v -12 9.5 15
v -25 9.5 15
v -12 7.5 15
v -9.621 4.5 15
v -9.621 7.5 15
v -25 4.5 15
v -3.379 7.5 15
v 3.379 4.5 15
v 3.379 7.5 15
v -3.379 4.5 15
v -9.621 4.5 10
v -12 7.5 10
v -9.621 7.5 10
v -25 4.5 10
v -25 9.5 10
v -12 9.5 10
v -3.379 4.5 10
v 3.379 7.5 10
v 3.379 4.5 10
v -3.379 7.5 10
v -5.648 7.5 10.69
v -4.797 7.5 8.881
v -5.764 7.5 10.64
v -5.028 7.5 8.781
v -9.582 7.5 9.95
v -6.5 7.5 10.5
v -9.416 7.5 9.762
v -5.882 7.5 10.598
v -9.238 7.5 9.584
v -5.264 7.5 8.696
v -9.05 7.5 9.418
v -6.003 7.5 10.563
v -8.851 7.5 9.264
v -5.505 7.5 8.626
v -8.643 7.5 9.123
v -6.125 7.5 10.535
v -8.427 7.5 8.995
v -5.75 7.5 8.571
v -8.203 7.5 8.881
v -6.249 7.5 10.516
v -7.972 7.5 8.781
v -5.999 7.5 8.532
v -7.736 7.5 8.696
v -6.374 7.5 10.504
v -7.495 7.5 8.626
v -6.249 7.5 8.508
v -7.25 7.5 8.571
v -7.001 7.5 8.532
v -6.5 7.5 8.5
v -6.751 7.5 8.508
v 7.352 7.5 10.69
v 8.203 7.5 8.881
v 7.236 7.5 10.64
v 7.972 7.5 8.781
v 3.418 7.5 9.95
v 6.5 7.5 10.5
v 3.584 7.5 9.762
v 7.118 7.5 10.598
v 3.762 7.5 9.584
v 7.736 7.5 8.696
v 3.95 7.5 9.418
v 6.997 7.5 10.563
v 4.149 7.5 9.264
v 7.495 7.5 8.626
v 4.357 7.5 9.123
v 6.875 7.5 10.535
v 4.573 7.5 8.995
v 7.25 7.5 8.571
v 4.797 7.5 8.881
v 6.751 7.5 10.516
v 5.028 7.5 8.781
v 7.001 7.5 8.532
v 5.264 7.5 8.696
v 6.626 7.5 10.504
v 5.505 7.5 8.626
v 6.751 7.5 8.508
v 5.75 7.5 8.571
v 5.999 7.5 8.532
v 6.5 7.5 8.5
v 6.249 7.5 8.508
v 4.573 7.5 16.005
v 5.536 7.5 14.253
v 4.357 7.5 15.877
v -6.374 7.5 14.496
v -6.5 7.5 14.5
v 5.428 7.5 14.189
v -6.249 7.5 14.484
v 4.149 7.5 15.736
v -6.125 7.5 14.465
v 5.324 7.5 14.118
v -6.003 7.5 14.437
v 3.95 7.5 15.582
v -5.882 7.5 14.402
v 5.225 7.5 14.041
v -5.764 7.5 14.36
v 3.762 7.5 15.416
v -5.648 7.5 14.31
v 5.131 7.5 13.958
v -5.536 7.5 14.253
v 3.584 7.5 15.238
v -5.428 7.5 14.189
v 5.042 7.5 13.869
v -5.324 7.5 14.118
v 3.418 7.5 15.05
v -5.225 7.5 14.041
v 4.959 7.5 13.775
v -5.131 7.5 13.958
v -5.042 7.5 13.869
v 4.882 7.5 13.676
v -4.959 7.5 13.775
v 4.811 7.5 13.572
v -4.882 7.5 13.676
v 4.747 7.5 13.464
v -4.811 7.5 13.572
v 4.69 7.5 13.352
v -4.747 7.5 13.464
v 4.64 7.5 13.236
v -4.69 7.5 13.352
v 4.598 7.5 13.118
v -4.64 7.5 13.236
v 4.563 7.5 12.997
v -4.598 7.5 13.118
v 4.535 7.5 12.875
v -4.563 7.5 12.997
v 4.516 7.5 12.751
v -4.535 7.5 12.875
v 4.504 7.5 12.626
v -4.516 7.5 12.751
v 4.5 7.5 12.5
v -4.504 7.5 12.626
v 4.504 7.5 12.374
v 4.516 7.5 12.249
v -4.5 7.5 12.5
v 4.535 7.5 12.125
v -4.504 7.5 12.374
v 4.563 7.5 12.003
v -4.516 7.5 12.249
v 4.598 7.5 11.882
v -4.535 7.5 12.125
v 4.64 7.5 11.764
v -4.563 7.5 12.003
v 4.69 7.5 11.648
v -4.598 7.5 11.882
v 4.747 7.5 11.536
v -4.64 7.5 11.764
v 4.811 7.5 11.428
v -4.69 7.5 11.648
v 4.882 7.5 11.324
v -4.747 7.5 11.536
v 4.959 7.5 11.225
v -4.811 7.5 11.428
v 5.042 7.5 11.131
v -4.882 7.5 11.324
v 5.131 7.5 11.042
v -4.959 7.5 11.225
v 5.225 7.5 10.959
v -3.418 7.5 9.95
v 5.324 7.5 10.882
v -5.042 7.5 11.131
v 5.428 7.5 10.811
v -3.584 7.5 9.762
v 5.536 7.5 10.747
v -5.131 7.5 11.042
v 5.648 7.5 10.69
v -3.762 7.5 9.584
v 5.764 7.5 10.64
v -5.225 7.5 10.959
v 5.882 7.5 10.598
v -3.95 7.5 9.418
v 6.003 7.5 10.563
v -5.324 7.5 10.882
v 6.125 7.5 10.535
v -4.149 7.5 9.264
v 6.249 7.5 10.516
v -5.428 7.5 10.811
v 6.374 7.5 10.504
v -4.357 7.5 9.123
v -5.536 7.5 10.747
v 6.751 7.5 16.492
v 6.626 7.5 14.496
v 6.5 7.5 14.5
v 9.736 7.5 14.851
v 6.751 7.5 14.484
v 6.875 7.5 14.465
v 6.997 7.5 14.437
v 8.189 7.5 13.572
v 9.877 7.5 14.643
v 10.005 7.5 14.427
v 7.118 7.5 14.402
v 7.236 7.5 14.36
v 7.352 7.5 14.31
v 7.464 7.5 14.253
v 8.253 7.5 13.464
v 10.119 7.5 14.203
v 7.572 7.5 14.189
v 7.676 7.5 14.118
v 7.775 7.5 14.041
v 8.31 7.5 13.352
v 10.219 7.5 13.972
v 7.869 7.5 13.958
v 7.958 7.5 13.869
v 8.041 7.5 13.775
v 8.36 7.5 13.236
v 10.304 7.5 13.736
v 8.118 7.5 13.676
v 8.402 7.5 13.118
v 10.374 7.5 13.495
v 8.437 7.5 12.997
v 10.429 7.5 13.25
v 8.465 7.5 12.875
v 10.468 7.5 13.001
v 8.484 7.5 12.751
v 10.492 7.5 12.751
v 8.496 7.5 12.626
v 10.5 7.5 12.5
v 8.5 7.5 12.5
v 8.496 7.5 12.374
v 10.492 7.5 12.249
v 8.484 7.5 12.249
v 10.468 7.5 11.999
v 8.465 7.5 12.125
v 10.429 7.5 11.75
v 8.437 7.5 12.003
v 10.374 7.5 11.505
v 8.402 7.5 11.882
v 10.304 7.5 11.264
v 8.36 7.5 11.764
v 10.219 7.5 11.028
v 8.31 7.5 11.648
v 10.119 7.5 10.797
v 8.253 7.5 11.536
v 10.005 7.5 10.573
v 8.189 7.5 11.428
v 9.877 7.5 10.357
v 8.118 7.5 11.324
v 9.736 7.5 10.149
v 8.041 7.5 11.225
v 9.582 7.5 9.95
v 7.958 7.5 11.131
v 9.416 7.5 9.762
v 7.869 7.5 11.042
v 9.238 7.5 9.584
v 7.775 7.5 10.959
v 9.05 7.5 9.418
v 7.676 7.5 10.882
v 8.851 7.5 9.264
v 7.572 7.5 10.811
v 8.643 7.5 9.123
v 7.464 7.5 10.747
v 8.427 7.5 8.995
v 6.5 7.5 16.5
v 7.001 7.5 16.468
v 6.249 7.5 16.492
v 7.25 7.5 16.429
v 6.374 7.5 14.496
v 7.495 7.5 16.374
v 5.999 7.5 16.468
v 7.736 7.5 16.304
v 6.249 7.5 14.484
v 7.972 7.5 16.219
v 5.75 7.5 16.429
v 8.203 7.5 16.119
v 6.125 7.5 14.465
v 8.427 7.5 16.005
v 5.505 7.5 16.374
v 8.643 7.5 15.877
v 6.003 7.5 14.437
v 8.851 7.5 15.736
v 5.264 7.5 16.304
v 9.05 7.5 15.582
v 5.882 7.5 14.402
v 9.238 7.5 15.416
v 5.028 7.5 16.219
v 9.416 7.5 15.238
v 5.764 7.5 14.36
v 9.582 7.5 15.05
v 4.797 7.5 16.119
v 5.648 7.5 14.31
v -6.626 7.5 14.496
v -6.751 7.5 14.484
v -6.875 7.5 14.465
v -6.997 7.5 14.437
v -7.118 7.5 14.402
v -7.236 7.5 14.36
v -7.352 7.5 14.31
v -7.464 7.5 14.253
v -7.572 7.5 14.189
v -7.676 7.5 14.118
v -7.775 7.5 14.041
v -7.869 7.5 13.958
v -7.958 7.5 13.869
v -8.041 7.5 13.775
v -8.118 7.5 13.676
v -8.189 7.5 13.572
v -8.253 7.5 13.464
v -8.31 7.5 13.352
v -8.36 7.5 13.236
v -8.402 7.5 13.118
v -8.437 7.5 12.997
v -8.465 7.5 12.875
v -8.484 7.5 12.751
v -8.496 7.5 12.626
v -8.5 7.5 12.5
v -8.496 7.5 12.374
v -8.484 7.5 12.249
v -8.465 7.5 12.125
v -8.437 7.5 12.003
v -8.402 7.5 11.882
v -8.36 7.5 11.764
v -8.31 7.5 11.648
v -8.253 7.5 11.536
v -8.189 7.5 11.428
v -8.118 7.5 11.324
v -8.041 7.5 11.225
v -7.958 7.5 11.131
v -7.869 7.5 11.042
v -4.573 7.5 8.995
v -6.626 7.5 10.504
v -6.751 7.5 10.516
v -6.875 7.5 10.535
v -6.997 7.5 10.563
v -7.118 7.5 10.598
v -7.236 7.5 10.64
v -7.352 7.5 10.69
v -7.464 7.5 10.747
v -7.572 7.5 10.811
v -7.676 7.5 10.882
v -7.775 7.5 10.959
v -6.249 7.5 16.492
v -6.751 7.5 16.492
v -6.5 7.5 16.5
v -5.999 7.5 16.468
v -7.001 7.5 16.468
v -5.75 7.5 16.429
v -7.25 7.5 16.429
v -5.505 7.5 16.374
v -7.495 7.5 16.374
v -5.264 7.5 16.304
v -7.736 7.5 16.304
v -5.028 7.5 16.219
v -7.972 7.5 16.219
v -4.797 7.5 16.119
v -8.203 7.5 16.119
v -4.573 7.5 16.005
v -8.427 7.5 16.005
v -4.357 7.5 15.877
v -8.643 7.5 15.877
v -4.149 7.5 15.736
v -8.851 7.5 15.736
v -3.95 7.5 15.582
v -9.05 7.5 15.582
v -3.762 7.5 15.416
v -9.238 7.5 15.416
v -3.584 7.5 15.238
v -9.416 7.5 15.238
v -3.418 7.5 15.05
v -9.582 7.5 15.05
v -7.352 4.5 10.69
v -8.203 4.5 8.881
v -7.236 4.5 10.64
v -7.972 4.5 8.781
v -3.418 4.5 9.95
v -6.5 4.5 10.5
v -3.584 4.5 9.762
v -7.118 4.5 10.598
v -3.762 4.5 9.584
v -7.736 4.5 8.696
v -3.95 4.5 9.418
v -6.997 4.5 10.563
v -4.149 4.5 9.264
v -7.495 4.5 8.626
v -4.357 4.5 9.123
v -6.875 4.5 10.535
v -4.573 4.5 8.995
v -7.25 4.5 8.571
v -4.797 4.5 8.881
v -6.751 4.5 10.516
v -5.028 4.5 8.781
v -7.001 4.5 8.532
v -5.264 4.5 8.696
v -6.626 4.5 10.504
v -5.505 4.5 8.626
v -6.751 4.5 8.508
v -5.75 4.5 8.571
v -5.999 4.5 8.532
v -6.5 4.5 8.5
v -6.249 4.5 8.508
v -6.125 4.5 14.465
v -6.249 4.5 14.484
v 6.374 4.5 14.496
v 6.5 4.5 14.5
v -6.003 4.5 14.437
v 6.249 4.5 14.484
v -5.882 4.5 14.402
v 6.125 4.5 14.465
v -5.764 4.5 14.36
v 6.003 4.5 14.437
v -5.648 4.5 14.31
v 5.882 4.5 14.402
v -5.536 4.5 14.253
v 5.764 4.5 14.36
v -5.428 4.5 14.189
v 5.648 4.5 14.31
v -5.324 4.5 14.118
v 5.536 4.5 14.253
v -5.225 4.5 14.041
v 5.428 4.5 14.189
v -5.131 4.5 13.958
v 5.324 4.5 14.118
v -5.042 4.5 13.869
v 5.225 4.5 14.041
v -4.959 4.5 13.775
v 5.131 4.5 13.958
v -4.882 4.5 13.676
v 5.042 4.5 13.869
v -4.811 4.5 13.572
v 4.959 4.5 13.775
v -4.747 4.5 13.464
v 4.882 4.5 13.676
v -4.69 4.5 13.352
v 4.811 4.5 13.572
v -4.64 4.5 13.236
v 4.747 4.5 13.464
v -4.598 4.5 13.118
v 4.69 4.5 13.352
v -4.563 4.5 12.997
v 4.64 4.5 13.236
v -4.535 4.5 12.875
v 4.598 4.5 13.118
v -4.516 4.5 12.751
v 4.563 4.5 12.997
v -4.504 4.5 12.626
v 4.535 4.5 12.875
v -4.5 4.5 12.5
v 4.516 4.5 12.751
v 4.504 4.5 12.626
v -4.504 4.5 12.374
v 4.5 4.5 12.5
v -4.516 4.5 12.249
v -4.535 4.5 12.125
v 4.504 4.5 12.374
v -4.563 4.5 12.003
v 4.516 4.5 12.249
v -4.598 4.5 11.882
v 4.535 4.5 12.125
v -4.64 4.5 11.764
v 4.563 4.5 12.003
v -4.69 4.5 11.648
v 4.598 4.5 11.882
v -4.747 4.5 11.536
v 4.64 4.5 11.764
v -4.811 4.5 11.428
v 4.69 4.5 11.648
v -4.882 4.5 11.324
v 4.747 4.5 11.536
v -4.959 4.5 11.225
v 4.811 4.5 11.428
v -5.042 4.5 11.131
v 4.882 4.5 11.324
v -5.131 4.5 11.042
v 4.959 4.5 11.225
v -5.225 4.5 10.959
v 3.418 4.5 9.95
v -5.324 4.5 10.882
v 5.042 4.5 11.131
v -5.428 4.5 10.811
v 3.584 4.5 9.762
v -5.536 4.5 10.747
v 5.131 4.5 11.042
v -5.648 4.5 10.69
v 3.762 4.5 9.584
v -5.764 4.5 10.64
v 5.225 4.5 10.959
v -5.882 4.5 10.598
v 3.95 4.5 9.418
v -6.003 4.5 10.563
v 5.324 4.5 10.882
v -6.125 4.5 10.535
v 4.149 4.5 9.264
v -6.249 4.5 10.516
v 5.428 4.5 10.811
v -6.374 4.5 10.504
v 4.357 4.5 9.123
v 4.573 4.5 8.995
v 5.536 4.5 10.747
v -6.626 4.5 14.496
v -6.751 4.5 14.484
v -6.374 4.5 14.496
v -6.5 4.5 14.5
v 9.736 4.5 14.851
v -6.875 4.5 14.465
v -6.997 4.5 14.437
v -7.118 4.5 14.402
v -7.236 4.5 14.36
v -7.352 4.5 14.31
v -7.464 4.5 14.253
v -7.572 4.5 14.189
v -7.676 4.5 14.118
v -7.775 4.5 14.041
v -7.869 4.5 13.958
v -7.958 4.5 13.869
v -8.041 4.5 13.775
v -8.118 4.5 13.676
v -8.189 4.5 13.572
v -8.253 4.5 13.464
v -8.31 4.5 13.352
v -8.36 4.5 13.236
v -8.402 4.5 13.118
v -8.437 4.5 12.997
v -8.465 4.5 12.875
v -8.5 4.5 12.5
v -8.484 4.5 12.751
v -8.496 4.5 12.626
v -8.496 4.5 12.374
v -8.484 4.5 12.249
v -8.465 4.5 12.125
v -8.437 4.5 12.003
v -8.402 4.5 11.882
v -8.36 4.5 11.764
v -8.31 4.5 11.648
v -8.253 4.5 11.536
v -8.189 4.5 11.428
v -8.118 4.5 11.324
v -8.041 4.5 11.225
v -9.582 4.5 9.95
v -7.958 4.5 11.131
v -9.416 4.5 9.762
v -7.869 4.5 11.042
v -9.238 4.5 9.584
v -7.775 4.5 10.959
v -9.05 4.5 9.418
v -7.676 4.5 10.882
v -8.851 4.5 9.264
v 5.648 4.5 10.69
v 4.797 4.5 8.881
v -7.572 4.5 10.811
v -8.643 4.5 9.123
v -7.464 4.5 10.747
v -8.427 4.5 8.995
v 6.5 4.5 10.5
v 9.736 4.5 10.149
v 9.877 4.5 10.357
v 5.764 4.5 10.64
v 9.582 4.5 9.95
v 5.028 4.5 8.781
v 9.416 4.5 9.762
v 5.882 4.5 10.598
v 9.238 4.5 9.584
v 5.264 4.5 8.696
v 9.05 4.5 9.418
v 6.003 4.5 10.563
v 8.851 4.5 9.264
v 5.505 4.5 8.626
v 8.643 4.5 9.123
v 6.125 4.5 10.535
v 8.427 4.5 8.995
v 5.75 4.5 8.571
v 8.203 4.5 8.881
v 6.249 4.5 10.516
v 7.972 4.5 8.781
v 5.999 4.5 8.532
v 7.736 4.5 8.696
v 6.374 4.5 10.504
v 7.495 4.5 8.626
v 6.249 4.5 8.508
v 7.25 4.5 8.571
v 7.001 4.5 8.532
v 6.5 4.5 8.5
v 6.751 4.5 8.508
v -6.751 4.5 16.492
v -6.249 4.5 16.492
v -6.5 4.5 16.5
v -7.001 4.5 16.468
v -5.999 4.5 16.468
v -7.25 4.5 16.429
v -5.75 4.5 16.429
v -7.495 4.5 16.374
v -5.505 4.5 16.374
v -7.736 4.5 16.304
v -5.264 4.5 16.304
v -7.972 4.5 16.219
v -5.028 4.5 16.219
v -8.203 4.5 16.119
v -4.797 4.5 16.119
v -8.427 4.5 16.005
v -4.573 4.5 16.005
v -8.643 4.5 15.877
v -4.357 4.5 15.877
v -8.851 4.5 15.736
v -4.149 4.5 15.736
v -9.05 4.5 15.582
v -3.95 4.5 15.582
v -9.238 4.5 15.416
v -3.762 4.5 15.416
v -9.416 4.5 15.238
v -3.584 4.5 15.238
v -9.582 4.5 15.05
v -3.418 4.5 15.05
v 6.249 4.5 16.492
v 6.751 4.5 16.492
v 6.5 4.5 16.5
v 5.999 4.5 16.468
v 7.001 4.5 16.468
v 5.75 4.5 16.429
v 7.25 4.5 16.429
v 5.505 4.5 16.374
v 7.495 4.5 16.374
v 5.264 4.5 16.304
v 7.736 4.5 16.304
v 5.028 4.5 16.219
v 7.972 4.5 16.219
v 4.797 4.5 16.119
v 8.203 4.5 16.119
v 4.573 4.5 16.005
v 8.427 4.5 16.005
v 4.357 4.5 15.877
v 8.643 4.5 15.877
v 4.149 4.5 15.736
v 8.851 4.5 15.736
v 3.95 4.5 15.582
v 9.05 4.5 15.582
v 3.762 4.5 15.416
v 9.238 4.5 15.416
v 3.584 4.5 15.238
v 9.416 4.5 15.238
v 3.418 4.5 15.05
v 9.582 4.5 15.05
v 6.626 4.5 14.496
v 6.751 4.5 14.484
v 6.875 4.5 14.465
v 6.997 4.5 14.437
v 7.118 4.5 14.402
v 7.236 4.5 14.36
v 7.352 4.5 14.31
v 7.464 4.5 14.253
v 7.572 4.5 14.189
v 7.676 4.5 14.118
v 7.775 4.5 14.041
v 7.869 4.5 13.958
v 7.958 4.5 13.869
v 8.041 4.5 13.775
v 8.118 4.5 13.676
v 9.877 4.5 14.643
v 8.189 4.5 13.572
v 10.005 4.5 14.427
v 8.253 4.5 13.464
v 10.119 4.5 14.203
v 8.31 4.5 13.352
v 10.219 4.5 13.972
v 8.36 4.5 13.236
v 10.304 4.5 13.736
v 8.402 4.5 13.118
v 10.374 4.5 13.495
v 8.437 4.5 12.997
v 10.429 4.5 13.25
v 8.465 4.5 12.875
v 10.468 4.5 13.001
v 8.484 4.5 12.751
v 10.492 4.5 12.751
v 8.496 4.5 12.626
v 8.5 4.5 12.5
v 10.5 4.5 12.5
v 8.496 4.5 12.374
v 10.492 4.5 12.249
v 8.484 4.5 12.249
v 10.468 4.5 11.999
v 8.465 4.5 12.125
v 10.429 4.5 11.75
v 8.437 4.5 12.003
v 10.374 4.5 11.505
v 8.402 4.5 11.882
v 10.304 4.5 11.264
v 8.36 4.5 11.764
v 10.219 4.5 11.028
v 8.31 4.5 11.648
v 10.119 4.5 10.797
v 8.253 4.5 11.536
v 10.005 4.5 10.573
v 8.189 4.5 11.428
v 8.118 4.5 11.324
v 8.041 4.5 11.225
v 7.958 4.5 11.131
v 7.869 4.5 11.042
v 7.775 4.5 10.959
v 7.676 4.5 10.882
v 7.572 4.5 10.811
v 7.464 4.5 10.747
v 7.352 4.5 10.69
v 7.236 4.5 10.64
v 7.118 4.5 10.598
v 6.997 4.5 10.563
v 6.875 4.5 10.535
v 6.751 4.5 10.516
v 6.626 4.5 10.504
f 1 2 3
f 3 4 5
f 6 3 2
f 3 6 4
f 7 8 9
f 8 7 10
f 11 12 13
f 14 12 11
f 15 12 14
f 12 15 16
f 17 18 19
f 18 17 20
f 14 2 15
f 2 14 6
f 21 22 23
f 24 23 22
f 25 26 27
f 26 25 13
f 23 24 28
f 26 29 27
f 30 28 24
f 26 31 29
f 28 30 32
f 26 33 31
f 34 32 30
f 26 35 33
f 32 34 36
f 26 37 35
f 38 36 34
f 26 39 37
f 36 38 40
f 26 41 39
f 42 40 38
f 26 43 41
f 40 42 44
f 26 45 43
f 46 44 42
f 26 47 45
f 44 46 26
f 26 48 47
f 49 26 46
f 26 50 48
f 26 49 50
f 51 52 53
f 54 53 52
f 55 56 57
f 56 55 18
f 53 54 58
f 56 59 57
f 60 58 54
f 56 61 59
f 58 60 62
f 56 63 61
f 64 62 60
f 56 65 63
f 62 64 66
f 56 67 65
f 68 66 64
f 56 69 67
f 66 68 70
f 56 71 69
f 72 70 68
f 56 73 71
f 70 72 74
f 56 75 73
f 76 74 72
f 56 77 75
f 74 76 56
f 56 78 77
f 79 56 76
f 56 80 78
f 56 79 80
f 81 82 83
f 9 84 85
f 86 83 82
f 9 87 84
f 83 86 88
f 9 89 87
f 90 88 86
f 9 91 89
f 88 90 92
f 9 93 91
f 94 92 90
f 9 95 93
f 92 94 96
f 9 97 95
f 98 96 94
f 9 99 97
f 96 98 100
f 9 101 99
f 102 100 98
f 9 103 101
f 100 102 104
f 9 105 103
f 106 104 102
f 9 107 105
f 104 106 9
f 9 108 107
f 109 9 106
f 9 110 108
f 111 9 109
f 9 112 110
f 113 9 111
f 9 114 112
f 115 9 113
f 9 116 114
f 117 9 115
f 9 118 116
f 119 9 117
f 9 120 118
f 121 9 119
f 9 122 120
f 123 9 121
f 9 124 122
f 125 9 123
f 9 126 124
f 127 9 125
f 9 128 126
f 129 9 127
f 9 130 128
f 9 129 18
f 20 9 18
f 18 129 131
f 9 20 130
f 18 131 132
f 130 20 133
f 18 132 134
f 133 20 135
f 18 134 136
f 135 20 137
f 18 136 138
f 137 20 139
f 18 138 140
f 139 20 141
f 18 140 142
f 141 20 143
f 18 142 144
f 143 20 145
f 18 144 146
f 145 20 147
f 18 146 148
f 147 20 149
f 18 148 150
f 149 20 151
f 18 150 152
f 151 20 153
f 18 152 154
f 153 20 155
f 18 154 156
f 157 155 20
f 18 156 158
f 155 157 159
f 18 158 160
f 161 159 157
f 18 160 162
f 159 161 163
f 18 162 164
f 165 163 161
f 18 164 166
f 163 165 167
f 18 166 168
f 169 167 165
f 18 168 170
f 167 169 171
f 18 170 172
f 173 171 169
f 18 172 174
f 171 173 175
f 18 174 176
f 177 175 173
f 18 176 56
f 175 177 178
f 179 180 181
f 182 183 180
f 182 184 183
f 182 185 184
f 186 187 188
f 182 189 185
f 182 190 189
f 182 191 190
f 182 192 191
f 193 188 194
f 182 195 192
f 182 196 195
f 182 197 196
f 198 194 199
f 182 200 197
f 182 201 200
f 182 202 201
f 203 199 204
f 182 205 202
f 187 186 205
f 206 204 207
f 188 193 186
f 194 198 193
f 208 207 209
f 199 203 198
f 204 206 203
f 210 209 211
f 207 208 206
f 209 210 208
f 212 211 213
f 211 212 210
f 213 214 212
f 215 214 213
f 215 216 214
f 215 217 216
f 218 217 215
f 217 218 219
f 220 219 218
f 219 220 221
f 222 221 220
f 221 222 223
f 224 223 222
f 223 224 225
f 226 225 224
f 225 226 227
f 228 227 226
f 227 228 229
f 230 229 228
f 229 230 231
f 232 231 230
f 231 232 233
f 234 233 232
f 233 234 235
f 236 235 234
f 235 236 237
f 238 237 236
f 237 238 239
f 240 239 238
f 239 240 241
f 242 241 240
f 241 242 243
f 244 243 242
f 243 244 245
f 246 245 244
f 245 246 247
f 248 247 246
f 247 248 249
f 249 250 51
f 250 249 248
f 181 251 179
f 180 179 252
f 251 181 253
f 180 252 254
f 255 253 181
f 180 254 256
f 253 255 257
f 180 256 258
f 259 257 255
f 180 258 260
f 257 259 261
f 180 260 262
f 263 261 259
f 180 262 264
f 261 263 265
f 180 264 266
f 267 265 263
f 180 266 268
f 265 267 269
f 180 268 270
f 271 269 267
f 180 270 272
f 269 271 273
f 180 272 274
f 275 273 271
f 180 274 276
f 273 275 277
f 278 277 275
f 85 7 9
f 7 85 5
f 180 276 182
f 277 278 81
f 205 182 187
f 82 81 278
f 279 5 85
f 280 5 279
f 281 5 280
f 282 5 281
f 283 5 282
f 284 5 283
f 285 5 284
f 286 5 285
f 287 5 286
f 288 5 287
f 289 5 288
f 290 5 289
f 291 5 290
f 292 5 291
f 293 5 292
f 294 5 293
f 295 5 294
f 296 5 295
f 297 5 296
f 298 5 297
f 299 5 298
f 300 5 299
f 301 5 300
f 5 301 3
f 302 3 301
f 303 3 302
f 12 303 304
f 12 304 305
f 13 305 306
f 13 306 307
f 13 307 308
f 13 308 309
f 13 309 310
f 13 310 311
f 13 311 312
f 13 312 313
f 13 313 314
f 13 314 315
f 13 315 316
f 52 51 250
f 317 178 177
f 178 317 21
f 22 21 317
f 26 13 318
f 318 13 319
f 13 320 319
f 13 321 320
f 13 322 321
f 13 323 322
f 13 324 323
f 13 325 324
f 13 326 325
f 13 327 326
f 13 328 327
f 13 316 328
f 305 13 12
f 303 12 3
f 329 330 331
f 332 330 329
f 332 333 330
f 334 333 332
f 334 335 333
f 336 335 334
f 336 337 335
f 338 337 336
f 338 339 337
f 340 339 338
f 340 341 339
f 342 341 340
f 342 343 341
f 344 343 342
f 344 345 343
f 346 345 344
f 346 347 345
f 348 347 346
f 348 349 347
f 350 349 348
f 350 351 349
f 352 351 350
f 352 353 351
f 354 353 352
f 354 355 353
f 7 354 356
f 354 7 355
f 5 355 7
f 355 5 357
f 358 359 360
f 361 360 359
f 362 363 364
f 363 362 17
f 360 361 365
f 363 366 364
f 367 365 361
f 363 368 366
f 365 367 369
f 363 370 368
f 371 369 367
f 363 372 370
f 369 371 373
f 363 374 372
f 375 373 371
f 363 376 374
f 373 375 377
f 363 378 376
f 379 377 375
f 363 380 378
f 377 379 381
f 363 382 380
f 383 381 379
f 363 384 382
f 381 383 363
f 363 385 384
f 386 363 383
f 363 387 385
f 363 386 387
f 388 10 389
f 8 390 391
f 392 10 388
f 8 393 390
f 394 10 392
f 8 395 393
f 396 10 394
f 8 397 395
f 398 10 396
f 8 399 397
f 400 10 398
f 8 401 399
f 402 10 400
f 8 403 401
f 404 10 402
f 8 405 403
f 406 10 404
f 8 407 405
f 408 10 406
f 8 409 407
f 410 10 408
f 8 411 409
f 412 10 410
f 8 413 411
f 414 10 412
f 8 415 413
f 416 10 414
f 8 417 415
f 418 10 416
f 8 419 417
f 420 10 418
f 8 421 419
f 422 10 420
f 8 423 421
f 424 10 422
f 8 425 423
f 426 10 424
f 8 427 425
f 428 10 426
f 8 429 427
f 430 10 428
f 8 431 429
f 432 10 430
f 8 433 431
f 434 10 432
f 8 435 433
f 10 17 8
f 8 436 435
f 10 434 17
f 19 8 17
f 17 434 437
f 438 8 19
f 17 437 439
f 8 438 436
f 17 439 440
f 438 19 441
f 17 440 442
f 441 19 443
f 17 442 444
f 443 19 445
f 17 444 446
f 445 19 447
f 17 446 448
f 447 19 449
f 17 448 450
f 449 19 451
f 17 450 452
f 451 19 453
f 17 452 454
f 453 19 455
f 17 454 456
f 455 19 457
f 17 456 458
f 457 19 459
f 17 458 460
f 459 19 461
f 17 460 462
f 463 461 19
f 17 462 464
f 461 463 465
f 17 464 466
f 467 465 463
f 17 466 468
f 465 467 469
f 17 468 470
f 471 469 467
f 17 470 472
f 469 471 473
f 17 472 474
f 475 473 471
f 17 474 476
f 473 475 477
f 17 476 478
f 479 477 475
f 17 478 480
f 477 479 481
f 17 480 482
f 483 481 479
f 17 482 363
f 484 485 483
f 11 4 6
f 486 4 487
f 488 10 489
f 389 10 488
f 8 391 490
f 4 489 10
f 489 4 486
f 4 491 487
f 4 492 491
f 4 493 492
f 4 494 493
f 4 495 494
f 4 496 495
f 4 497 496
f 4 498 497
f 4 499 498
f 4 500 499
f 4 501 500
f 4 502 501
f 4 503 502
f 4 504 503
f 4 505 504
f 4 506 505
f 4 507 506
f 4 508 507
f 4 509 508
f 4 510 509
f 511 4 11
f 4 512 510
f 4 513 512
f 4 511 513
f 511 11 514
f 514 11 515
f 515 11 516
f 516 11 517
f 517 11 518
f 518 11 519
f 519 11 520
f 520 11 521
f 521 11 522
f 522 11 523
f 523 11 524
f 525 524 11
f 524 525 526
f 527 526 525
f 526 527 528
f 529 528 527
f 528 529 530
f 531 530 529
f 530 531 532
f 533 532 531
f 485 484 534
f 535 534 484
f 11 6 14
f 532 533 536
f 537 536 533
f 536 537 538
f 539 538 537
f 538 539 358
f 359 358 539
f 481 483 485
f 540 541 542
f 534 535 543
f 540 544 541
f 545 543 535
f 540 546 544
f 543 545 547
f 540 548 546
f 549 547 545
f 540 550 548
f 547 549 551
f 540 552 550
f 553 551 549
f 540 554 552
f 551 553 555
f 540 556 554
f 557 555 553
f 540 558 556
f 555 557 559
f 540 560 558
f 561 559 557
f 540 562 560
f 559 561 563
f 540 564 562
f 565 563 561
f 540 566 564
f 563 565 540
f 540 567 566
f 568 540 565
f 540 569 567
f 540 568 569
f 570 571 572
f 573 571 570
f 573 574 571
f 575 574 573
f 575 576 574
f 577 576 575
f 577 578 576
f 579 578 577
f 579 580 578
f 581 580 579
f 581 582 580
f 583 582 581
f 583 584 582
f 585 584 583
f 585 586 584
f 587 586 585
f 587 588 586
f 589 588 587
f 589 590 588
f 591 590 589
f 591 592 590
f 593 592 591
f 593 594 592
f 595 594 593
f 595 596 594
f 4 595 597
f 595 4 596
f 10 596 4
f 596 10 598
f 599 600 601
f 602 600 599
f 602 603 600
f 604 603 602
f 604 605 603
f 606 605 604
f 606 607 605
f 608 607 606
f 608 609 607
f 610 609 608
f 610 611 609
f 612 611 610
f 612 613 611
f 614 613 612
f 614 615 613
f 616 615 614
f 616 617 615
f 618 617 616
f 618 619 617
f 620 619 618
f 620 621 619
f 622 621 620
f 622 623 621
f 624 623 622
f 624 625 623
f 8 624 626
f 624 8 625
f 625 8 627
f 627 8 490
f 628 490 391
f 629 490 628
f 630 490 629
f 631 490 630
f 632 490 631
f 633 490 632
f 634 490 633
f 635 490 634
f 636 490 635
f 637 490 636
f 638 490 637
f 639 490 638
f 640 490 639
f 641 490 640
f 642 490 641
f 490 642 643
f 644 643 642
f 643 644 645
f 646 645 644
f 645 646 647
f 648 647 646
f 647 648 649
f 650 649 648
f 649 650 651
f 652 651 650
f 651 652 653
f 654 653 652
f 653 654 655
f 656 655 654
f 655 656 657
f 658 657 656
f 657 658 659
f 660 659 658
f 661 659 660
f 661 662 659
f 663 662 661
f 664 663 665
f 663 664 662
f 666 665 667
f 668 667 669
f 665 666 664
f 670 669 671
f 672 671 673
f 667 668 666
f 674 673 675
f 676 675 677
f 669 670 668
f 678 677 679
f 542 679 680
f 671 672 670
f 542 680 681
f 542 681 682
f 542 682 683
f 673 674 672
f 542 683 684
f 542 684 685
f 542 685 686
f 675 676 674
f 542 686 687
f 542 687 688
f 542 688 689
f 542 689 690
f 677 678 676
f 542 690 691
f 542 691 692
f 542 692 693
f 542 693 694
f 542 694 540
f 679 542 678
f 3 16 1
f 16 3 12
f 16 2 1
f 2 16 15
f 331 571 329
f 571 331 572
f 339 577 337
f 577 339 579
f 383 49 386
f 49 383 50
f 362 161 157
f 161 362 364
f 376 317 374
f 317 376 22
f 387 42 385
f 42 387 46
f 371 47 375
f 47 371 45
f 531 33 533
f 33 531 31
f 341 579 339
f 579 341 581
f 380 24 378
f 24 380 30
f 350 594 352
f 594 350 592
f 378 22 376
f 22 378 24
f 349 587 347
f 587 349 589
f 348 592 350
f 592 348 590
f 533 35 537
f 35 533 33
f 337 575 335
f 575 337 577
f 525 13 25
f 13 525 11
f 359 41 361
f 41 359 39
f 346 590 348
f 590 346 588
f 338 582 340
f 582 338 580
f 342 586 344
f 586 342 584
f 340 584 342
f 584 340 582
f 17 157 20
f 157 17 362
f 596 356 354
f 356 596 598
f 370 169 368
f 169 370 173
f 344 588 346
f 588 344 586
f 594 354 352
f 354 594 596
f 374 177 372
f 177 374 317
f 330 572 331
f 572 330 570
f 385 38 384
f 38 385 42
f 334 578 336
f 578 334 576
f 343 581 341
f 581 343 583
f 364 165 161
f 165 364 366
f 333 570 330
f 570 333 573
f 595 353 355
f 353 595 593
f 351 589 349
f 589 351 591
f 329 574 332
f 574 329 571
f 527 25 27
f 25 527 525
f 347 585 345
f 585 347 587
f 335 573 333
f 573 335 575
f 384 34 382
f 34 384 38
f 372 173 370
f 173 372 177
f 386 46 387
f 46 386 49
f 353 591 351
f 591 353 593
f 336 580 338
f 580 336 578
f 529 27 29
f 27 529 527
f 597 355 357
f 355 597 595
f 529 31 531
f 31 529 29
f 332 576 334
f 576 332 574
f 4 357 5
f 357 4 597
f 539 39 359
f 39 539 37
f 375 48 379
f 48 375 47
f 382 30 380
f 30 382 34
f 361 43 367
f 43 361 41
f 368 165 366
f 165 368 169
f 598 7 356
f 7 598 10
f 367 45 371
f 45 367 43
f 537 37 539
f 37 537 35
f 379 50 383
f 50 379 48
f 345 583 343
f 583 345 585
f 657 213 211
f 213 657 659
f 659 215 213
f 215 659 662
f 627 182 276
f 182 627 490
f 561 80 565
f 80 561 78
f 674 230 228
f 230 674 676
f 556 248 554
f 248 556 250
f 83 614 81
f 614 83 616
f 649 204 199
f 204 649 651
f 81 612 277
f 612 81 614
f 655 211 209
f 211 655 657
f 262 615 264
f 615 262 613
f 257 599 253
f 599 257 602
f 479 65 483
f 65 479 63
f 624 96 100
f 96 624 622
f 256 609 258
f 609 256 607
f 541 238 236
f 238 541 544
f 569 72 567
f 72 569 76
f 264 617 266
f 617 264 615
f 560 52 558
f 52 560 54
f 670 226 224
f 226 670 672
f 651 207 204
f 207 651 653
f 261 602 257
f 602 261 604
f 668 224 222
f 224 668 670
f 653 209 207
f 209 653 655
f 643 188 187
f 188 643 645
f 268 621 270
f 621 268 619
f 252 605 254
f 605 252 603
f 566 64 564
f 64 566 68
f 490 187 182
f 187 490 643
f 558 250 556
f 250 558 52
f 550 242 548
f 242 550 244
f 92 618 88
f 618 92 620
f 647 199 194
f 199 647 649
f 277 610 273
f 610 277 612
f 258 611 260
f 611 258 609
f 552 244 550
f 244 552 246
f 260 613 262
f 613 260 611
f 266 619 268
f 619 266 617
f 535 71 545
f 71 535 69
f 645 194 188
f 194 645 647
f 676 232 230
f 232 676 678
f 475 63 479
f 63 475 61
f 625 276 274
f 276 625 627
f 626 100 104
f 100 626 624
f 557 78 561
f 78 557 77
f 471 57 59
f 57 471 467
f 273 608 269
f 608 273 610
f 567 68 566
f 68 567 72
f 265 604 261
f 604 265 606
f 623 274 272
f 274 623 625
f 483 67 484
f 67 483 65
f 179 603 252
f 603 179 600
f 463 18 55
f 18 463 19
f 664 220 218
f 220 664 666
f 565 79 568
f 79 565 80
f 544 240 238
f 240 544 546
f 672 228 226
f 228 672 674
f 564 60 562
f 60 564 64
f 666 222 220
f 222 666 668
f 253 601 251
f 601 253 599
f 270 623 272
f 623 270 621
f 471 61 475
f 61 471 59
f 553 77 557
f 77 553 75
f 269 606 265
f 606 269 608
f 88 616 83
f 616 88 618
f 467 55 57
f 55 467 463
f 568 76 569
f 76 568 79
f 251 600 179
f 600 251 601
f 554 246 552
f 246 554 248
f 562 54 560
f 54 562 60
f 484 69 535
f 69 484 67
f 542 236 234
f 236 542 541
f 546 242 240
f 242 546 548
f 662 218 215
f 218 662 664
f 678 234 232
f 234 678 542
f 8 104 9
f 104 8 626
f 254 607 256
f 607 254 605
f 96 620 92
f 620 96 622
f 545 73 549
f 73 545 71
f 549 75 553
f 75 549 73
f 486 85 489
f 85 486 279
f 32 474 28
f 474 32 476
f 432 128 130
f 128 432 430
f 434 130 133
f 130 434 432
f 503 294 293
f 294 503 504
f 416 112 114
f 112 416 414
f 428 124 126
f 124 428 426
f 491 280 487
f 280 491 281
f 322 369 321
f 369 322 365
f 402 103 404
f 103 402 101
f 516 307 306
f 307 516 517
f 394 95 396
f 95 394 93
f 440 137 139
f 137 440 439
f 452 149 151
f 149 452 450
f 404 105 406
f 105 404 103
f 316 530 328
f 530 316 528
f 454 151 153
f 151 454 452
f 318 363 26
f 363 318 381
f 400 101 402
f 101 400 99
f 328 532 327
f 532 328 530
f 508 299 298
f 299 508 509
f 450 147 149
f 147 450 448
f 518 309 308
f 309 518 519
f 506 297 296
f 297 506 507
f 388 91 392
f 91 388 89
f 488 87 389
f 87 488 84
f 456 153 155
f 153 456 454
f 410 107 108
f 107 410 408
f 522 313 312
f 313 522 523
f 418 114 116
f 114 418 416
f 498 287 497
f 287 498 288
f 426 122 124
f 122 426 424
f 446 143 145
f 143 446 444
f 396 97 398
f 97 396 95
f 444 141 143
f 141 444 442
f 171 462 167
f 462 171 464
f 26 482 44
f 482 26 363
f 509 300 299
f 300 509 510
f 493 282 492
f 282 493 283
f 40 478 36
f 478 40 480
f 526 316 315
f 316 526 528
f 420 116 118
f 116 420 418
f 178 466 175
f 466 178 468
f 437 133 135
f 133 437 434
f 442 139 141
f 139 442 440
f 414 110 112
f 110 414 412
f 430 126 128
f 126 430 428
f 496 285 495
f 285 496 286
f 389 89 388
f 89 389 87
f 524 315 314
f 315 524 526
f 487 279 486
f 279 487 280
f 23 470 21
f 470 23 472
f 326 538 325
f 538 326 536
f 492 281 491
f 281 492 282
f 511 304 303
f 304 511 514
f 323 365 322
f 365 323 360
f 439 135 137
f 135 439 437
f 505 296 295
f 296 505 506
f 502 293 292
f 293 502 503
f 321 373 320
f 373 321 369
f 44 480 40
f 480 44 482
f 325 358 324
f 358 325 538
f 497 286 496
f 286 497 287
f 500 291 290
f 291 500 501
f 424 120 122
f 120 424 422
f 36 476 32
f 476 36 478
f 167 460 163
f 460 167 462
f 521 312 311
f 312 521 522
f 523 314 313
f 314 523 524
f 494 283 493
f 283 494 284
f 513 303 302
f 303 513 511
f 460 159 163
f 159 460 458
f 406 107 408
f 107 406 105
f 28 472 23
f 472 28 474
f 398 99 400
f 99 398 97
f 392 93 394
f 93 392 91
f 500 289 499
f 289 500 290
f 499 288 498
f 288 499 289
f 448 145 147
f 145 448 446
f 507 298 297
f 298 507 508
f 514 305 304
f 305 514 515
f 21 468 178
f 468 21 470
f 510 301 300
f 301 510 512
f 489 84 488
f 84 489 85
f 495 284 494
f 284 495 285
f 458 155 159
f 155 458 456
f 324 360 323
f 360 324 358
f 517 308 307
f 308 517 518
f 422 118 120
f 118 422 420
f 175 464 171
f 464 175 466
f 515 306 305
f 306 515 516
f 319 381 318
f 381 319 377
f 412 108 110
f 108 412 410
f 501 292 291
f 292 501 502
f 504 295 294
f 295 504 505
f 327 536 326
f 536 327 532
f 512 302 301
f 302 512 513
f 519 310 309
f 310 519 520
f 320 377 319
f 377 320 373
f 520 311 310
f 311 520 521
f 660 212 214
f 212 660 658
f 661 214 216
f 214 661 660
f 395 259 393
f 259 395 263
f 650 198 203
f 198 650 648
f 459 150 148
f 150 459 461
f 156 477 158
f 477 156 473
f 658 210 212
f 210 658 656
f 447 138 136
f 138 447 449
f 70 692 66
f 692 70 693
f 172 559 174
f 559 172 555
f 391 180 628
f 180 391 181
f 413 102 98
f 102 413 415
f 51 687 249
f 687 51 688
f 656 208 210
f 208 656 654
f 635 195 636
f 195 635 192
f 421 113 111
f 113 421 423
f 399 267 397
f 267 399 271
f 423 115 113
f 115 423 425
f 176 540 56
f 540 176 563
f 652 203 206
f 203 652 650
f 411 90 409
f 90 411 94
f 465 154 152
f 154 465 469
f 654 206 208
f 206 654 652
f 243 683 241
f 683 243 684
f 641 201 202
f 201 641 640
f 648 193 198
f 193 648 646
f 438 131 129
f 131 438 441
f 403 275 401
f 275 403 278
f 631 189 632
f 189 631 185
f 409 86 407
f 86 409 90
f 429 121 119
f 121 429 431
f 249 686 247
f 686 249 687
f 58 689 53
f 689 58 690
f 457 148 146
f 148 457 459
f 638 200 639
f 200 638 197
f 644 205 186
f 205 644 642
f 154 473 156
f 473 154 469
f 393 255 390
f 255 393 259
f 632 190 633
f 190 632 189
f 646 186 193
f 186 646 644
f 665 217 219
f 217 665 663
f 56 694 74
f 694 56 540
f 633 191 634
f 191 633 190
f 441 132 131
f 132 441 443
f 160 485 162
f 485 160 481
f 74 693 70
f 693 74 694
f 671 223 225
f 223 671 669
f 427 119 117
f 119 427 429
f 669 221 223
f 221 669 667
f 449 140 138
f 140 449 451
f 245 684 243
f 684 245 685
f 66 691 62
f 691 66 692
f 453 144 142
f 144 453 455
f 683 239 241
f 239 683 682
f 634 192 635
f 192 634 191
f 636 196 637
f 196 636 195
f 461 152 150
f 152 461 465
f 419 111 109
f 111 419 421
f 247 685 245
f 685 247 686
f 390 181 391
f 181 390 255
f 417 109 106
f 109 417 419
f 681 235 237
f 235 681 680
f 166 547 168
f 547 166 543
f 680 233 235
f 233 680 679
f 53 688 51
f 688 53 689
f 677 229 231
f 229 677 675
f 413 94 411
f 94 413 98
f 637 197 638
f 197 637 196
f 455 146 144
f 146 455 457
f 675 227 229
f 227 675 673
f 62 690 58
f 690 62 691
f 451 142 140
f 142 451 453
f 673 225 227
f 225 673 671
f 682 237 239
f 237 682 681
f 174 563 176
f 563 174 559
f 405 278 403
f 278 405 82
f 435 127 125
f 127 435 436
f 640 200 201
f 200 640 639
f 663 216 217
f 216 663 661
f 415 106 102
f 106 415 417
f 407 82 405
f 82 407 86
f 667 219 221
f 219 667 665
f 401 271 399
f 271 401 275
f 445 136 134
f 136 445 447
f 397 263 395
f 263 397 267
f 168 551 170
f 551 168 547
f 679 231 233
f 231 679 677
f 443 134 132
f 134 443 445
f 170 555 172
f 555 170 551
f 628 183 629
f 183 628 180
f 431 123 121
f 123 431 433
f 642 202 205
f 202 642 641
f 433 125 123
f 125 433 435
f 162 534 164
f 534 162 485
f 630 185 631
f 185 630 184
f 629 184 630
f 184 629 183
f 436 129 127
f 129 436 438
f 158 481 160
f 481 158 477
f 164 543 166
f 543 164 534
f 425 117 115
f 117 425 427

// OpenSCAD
difference(){
	union(){
        
        translate([-25,4.5,10]){
            cube([15+17,3,5], center=false);
        }         
        translate([-25,4.5,10]){
            cube([13,5,5], center=false);
        }         
        


        translate([-6.5,7.5,12.5]){
            rotate([90,0,0]){
                cylinder(h=3, r=4, $fn=100, center=false);
            }
        }         
        translate([6.5,7.5,12.5]){
            rotate([90,0,0]){
                cylinder(h=3, r=4, $fn=100, center=false);
            }
        }         


	}
	union() {
        translate([-6.5,8.5,12.5]){
            rotate([90,0,0]){
                cylinder(h=25, r=2, $fn=100, center=false);
            }
        }         
        translate([6.5,8.5,12.5]){
            rotate([90,0,0]){
                cylinder(h=25, r=2, $fn=100, center=false);
            }
        }             


   

	}
}
